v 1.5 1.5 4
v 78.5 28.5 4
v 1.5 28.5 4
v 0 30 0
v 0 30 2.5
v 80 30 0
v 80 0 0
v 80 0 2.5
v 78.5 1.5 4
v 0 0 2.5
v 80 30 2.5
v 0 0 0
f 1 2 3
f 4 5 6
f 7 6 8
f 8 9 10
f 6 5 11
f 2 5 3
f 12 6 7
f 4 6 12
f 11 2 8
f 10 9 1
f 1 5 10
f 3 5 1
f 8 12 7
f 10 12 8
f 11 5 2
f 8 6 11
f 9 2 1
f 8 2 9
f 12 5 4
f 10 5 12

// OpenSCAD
// Blank nameplate with a chamfer around the top face.
plate_x = 80;
plate_y = 30;
plate_z = 4;
chamfer = 1.5;

module nameplate() {
    hull() {
        cube([plate_x, plate_y, plate_z - chamfer]);
        translate([chamfer, chamfer, 0])
            cube([plate_x - 2 * chamfer, plate_y - 2 * chamfer, plate_z]);
    }
}

nameplate();
